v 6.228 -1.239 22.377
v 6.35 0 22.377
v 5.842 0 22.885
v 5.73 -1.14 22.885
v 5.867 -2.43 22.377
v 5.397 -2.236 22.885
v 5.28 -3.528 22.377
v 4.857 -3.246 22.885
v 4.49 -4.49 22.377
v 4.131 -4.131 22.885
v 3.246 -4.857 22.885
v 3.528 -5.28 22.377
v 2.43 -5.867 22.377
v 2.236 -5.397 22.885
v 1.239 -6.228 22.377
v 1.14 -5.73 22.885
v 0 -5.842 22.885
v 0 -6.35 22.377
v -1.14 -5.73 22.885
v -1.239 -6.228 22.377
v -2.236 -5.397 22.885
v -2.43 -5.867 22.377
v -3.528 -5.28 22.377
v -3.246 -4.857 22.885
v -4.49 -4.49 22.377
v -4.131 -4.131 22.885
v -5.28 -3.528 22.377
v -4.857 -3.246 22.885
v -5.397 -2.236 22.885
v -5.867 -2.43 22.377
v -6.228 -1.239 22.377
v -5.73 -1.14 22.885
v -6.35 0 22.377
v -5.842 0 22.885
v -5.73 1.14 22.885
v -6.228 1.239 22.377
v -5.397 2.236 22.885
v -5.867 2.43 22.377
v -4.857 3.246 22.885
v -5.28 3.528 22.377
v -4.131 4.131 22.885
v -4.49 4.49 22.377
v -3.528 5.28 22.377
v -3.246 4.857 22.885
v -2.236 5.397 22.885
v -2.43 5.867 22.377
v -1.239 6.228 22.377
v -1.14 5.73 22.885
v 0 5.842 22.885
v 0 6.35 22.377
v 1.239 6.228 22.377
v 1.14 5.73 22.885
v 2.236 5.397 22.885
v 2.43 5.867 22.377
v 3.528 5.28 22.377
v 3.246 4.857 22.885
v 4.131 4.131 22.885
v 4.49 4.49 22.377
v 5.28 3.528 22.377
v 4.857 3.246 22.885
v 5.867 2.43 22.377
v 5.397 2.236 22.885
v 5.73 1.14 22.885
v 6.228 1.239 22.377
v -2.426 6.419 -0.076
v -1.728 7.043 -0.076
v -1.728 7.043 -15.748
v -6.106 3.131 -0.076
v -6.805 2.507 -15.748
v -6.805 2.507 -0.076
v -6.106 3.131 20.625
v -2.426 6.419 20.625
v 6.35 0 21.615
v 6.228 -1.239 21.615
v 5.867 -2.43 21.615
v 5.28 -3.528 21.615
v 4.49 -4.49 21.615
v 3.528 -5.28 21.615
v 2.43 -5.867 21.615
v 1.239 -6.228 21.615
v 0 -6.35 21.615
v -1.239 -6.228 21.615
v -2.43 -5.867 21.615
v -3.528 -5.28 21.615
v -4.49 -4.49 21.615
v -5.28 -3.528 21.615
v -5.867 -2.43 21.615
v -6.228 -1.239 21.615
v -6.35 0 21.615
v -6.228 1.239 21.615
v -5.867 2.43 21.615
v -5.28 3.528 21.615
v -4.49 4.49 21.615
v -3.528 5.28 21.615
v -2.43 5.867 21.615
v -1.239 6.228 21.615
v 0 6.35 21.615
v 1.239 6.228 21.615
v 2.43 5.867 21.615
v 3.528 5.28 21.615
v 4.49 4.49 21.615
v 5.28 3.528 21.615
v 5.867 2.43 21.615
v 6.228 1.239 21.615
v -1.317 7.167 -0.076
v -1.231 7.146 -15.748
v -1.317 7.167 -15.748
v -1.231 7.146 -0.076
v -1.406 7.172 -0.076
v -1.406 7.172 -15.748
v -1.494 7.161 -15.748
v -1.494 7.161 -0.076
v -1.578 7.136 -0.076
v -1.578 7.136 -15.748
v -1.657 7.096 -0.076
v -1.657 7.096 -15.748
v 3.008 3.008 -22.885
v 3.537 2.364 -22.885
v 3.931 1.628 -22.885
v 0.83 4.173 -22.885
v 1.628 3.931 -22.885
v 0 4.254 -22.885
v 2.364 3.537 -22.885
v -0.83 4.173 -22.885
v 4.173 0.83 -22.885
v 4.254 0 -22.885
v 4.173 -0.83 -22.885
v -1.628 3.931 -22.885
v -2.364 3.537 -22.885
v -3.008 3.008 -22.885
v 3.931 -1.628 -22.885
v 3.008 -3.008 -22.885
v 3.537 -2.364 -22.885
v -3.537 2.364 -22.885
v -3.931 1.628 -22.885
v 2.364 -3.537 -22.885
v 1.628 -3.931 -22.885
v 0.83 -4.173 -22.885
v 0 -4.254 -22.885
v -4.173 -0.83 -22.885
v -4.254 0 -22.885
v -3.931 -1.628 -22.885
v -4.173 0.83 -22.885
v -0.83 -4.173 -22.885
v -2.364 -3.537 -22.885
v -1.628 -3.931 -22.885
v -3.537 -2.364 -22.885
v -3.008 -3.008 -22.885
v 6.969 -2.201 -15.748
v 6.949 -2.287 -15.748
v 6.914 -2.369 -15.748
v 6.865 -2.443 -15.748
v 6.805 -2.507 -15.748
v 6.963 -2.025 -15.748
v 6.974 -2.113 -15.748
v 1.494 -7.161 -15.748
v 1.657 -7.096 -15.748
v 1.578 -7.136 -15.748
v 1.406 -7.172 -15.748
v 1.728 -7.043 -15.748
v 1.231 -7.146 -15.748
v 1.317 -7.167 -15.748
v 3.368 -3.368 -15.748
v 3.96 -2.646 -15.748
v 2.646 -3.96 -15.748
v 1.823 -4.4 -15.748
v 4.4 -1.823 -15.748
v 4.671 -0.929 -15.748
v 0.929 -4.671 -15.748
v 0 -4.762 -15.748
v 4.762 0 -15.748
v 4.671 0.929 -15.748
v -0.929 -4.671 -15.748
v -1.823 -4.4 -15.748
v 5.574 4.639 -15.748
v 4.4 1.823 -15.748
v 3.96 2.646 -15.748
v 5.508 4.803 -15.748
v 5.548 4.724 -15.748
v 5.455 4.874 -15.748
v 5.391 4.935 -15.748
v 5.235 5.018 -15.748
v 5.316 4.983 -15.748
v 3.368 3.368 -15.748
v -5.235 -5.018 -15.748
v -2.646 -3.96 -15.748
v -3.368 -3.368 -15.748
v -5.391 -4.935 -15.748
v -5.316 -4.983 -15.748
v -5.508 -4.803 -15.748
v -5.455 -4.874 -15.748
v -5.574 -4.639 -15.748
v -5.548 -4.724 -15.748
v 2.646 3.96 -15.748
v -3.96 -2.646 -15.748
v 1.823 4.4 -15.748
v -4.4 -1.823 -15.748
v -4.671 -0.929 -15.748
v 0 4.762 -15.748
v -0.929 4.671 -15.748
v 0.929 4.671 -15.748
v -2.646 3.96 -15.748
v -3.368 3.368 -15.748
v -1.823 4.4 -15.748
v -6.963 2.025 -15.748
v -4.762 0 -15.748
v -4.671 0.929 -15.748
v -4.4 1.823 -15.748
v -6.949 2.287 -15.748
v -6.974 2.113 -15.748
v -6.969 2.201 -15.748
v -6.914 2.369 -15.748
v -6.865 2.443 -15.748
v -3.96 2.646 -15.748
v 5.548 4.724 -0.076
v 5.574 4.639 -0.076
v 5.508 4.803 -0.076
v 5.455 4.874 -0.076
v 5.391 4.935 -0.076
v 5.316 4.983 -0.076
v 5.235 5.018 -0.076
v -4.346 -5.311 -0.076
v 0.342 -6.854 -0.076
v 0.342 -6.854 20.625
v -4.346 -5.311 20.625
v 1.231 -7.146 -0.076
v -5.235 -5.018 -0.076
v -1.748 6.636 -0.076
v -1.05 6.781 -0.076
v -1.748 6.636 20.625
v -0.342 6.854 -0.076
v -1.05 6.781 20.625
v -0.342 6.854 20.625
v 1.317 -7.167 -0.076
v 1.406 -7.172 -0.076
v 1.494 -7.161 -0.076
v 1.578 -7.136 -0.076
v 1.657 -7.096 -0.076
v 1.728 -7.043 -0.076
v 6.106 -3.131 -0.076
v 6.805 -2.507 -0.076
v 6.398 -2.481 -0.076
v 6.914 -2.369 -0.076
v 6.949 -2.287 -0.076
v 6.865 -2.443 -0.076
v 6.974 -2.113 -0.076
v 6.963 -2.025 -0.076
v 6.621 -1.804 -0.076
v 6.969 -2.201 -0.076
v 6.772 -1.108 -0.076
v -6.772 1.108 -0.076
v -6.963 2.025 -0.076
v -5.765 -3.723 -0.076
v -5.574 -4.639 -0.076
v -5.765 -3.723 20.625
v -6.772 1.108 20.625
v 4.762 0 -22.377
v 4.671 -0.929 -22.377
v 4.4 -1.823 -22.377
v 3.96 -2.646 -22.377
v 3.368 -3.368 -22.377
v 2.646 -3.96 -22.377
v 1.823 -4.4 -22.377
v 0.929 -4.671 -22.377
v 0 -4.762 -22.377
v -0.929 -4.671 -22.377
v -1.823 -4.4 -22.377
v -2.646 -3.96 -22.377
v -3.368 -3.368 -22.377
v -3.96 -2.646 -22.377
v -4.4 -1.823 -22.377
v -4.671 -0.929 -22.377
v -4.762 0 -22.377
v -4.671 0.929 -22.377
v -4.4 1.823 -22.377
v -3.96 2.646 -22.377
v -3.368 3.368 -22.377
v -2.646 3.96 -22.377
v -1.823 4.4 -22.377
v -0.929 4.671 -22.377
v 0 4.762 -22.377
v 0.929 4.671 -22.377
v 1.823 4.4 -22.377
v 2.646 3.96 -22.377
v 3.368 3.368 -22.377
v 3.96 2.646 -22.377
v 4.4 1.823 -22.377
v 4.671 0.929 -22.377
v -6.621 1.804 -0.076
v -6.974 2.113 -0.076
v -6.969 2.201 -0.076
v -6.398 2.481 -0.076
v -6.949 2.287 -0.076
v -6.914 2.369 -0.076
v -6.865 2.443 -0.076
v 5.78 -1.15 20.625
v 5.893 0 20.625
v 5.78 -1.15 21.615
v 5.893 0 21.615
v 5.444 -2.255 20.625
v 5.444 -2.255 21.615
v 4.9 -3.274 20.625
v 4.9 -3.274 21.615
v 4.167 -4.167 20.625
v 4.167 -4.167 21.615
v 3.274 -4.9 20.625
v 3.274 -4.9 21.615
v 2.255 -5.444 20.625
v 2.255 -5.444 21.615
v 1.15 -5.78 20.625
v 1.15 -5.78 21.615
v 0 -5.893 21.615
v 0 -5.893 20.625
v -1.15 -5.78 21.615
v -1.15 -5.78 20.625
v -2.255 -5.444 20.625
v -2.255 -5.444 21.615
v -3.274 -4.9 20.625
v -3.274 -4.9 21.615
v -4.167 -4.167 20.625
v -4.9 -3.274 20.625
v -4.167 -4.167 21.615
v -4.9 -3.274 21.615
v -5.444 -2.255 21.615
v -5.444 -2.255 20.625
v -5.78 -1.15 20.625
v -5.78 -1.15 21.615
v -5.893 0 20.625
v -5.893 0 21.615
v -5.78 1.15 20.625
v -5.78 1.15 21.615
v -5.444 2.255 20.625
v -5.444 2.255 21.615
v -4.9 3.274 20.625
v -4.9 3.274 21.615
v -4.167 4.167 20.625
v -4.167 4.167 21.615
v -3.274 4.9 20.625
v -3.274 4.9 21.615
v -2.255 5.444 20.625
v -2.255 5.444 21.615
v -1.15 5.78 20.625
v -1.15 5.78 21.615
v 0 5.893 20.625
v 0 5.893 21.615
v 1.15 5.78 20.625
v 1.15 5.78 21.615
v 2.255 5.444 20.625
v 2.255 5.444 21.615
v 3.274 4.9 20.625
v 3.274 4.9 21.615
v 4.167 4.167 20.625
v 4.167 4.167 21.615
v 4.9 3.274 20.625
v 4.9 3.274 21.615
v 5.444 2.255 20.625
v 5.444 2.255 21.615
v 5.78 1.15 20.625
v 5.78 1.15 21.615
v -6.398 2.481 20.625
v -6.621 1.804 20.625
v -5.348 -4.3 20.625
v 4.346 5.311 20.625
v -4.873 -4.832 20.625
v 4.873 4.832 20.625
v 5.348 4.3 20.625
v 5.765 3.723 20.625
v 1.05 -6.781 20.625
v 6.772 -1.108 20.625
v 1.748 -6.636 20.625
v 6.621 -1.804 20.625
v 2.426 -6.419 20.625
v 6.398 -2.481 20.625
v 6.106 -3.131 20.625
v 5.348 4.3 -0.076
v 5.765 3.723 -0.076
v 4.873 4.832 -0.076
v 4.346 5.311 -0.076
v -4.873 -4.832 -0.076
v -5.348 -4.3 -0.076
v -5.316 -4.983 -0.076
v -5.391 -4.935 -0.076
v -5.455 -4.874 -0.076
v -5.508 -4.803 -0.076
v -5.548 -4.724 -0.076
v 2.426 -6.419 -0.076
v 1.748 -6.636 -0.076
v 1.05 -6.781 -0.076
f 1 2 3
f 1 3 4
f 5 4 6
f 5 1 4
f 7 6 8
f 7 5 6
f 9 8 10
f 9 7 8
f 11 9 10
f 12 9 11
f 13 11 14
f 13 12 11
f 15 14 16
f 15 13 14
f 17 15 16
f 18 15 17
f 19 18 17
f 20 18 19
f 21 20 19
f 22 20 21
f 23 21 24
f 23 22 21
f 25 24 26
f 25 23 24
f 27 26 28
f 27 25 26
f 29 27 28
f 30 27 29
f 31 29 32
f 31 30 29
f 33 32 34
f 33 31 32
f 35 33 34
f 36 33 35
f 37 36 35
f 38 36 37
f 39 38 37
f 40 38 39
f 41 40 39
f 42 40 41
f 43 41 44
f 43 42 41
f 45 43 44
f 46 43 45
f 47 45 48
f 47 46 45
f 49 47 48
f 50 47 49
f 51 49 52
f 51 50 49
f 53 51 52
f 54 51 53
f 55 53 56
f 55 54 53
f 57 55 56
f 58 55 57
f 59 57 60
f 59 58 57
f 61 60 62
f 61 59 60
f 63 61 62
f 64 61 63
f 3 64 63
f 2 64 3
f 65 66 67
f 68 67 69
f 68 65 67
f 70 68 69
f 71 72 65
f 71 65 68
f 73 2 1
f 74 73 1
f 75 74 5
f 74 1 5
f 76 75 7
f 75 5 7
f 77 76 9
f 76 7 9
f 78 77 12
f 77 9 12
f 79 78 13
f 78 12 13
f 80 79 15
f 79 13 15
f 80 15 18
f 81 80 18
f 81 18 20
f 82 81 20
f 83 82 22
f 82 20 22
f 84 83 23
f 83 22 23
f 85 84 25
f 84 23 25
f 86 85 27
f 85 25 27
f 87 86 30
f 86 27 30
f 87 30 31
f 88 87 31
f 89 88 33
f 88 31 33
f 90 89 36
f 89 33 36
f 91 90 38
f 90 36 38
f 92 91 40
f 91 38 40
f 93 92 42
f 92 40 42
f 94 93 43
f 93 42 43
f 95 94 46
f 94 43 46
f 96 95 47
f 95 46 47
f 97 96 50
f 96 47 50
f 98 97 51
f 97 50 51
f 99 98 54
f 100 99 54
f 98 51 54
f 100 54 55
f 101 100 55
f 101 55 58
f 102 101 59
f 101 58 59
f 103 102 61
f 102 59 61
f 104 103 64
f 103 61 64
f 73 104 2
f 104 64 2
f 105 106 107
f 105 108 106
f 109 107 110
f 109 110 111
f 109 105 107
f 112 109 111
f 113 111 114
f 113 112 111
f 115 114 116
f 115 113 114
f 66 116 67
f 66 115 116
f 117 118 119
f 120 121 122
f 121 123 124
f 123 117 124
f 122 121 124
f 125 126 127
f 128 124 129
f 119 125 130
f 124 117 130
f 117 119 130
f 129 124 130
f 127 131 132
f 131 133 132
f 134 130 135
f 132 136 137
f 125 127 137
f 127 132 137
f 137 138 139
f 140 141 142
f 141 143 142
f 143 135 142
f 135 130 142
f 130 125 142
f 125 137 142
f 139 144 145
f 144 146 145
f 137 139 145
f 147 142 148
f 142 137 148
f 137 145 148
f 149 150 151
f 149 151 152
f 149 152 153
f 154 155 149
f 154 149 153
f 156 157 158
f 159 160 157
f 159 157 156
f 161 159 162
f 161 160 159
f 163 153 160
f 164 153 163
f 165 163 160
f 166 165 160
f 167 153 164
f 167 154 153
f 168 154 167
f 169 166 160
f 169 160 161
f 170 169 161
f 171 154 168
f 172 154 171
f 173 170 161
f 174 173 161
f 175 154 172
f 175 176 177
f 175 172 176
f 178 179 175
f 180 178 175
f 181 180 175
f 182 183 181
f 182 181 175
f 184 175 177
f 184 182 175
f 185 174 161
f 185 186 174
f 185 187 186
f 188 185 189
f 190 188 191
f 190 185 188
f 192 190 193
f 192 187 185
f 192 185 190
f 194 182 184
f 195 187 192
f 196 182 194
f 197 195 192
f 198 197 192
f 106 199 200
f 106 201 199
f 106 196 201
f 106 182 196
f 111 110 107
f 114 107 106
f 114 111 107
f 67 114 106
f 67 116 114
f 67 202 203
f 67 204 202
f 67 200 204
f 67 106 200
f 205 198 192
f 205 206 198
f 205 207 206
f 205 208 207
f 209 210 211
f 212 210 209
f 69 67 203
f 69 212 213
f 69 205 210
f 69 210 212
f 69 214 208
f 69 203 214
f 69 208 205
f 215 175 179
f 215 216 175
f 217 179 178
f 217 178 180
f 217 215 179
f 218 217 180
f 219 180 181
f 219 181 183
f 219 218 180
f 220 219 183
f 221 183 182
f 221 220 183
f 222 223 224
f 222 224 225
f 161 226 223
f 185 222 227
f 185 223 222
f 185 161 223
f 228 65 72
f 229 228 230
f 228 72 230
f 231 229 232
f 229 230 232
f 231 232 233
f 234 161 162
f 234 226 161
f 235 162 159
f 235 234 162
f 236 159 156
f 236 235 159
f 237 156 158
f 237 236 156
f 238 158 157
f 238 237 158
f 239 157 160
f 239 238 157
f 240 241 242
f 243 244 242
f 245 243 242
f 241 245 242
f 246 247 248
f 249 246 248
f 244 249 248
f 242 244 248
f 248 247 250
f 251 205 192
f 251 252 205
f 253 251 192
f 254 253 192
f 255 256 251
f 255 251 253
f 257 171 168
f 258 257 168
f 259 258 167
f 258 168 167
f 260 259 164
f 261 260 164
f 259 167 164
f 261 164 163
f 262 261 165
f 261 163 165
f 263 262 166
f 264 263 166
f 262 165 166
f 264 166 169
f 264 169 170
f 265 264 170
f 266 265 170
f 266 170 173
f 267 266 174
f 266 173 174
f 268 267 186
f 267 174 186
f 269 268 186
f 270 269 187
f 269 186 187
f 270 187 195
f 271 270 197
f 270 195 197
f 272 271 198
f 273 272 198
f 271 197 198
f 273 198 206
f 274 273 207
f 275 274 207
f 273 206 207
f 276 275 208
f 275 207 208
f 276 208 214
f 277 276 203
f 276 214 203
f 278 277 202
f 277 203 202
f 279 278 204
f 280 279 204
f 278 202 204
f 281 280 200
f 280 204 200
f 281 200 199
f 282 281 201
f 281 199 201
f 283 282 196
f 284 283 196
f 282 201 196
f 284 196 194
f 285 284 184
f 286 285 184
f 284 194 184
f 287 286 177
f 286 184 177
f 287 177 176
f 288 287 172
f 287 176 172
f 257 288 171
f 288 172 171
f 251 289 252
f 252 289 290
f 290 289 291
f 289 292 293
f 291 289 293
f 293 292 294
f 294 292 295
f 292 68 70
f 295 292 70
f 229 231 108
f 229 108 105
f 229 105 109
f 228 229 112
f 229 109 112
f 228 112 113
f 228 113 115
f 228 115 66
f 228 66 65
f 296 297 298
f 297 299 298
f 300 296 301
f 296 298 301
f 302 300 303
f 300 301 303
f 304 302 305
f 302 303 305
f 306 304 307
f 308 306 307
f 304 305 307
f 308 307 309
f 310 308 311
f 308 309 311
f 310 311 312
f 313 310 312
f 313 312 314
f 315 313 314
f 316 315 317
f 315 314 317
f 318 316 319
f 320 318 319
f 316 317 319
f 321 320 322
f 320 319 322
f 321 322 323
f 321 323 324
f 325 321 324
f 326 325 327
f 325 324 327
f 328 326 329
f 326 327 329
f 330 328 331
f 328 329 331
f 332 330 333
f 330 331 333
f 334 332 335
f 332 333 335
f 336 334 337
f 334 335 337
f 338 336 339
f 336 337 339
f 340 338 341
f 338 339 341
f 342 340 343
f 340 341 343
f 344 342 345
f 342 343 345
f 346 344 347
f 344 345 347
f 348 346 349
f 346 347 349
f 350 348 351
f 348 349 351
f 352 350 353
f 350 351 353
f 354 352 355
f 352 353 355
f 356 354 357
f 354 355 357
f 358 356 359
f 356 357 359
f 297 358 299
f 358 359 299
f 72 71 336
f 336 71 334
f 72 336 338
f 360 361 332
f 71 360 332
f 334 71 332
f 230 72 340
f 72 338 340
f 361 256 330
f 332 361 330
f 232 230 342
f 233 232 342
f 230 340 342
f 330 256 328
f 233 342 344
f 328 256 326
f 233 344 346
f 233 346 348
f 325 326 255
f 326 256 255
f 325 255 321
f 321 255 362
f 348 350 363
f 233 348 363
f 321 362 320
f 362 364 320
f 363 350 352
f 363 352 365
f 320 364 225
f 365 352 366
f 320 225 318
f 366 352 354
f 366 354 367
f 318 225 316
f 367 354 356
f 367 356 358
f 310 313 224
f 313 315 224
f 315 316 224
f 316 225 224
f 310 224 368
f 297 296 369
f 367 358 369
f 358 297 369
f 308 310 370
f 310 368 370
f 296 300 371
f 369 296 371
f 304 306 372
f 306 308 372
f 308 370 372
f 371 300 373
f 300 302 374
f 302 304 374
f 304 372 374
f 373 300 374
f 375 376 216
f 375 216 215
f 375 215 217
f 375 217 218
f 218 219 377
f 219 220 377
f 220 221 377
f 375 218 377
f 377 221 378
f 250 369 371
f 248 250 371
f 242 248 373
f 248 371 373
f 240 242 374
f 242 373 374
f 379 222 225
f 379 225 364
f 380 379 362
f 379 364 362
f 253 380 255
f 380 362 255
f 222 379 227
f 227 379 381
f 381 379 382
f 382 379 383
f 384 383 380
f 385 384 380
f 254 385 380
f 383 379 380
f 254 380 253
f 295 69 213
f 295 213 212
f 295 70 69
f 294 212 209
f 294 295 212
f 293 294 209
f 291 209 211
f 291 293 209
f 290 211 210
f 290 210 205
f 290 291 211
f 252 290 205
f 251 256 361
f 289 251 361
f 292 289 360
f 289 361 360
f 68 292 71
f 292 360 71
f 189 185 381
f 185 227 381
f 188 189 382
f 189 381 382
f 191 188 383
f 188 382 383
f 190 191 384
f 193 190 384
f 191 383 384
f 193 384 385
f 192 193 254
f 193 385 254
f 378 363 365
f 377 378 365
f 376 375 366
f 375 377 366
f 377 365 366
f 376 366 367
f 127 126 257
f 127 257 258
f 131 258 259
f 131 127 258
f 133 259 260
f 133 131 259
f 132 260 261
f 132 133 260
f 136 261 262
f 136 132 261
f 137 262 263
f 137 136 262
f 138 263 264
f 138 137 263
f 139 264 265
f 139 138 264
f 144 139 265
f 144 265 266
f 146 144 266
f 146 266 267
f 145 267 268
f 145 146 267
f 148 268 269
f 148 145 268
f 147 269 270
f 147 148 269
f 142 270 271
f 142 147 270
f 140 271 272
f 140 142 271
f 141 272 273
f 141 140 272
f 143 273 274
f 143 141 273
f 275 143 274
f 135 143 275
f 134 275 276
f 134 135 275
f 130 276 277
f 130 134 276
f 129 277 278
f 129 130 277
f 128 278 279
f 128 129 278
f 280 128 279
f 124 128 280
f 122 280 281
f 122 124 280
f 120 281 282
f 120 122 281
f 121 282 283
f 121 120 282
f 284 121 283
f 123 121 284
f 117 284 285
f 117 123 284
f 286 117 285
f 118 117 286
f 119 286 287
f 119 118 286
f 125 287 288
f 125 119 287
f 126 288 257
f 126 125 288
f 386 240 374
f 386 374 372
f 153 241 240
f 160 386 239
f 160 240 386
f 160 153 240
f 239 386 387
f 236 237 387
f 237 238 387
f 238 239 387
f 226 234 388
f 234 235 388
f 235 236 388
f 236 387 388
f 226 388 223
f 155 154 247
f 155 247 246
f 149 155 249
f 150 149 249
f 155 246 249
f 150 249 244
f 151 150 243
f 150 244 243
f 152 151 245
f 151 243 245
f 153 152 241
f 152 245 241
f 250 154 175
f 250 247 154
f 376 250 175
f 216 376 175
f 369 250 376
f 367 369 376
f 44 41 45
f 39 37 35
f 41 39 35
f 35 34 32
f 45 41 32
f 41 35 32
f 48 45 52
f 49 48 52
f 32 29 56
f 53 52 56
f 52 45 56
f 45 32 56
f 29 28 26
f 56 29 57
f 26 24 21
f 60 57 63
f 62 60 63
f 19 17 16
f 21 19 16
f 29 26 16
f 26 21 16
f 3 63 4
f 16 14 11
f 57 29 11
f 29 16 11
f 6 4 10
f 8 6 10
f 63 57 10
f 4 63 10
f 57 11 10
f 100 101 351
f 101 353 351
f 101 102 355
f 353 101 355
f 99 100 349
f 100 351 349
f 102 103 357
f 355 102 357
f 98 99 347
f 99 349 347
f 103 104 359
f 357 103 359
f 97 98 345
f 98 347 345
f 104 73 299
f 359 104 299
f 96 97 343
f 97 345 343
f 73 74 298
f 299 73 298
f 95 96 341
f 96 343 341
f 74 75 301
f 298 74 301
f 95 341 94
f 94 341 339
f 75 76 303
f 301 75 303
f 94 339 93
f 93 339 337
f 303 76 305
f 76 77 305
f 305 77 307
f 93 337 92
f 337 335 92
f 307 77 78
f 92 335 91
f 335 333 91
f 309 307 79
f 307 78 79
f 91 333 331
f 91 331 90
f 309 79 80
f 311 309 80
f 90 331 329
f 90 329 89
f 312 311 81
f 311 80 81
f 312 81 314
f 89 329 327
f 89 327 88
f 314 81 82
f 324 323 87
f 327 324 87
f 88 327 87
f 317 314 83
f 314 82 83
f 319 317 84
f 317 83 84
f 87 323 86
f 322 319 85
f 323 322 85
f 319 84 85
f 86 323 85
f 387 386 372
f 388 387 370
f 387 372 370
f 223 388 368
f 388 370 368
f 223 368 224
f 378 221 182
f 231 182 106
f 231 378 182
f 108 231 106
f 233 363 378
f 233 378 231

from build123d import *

# Parameters (mm, degrees)
SKETCH3_OUTSIDE_W   = 25.668
SKETCH3_OUTSIDE_H   = 25.668
CUT_EXTRUDE1_DEPTH  = 47.788336733
CHAMFER1_SIZE       = 0.508
BOSS_EXTRUDE1_DEPTH = 15.6718
FILLET1_R           = 0.508


with BuildPart() as part:
    # Sketch2 → Revolve1 (revolve)
    with BuildSketch(Plane(origin=(0, 0, 0), x_dir=(0, 0, -1), z_dir=(1, 0, 0)), mode=Mode.PRIVATE) as revolve1_sk:
        Polygon((-22.8854, 6.35), (-22.8854, 0), (22.8854, 0), (22.8854, 4.7625), (15.748, 4.7625), (15.748, 6.862299966), (-20.6248, 6.862299966), (-20.6248, 5.8928), (-21.6154, 5.8928), (-21.6154, 6.35), align=None)
    revolve(revolve1_sk.sketch.rotate(Axis((0, 0, 6.497503614), (0, 0, -1)), 90), axis=Axis((0, 0, 6.497503614), (0, 0, -1)))

    # Sketch3 outside → Cut-Extrude1 (cut, through all)
    with BuildSketch(Plane.XY.offset(22.8854)):
        Rectangle(SKETCH3_OUTSIDE_W, SKETCH3_OUTSIDE_H)
        Polygon((1.509607841, -7.238192802), (7.023262765, -2.311737661), (5.513654923, 4.926455141), (-1.509607841, 7.238192802), (-7.023262765, 2.311737661), (-5.513654923, -4.926455141), align=None, mode=Mode.SUBTRACT)
    extrude(amount=-CUT_EXTRUDE1_DEPTH, mode=Mode.SUBTRACT)

    # Chamfer1
    chamfer1_edges = [part.edges().sort_by_distance(p)[0] for p in [
        (-6.35, 0, 22.8854),
        (-4.7625, 0, -22.8854),
    ]]
    chamfer(chamfer1_edges, length=CHAMFER1_SIZE)

    # Sketch4 → Boss-Extrude1 (add)
    with BuildSketch(Plane(origin=(0, 0, -15.748), x_dir=(-1, 0, 0), z_dir=(0, 0, -1))):
        Polygon((-1.509607841, -7.238192802), (5.513654923, -4.926455141), (7.023262765, 2.311737661), (1.509607841, 7.238192802), (-5.513654923, 4.926455141), (-7.023262765, -2.311737661), align=None)
    extrude(amount=-BOSS_EXTRUDE1_DEPTH)

    # Fillet1
    fillet1_edges = [part.edges().sort_by_distance(p)[0] for p in [
        (1.509607841, -7.238192802, -7.9121),
        (7.023262765, -2.311737661, -7.9121),
        (5.513654923, 4.926455141, -7.9121),
        (-1.509607841, 7.238192802, -7.9121),
        (-7.023262765, 2.311737661, -7.9121),
        (-5.513654923, -4.926455141, -7.9121),
    ]]
    fillet(fillet1_edges, radius=FILLET1_R)


solid = part.part
